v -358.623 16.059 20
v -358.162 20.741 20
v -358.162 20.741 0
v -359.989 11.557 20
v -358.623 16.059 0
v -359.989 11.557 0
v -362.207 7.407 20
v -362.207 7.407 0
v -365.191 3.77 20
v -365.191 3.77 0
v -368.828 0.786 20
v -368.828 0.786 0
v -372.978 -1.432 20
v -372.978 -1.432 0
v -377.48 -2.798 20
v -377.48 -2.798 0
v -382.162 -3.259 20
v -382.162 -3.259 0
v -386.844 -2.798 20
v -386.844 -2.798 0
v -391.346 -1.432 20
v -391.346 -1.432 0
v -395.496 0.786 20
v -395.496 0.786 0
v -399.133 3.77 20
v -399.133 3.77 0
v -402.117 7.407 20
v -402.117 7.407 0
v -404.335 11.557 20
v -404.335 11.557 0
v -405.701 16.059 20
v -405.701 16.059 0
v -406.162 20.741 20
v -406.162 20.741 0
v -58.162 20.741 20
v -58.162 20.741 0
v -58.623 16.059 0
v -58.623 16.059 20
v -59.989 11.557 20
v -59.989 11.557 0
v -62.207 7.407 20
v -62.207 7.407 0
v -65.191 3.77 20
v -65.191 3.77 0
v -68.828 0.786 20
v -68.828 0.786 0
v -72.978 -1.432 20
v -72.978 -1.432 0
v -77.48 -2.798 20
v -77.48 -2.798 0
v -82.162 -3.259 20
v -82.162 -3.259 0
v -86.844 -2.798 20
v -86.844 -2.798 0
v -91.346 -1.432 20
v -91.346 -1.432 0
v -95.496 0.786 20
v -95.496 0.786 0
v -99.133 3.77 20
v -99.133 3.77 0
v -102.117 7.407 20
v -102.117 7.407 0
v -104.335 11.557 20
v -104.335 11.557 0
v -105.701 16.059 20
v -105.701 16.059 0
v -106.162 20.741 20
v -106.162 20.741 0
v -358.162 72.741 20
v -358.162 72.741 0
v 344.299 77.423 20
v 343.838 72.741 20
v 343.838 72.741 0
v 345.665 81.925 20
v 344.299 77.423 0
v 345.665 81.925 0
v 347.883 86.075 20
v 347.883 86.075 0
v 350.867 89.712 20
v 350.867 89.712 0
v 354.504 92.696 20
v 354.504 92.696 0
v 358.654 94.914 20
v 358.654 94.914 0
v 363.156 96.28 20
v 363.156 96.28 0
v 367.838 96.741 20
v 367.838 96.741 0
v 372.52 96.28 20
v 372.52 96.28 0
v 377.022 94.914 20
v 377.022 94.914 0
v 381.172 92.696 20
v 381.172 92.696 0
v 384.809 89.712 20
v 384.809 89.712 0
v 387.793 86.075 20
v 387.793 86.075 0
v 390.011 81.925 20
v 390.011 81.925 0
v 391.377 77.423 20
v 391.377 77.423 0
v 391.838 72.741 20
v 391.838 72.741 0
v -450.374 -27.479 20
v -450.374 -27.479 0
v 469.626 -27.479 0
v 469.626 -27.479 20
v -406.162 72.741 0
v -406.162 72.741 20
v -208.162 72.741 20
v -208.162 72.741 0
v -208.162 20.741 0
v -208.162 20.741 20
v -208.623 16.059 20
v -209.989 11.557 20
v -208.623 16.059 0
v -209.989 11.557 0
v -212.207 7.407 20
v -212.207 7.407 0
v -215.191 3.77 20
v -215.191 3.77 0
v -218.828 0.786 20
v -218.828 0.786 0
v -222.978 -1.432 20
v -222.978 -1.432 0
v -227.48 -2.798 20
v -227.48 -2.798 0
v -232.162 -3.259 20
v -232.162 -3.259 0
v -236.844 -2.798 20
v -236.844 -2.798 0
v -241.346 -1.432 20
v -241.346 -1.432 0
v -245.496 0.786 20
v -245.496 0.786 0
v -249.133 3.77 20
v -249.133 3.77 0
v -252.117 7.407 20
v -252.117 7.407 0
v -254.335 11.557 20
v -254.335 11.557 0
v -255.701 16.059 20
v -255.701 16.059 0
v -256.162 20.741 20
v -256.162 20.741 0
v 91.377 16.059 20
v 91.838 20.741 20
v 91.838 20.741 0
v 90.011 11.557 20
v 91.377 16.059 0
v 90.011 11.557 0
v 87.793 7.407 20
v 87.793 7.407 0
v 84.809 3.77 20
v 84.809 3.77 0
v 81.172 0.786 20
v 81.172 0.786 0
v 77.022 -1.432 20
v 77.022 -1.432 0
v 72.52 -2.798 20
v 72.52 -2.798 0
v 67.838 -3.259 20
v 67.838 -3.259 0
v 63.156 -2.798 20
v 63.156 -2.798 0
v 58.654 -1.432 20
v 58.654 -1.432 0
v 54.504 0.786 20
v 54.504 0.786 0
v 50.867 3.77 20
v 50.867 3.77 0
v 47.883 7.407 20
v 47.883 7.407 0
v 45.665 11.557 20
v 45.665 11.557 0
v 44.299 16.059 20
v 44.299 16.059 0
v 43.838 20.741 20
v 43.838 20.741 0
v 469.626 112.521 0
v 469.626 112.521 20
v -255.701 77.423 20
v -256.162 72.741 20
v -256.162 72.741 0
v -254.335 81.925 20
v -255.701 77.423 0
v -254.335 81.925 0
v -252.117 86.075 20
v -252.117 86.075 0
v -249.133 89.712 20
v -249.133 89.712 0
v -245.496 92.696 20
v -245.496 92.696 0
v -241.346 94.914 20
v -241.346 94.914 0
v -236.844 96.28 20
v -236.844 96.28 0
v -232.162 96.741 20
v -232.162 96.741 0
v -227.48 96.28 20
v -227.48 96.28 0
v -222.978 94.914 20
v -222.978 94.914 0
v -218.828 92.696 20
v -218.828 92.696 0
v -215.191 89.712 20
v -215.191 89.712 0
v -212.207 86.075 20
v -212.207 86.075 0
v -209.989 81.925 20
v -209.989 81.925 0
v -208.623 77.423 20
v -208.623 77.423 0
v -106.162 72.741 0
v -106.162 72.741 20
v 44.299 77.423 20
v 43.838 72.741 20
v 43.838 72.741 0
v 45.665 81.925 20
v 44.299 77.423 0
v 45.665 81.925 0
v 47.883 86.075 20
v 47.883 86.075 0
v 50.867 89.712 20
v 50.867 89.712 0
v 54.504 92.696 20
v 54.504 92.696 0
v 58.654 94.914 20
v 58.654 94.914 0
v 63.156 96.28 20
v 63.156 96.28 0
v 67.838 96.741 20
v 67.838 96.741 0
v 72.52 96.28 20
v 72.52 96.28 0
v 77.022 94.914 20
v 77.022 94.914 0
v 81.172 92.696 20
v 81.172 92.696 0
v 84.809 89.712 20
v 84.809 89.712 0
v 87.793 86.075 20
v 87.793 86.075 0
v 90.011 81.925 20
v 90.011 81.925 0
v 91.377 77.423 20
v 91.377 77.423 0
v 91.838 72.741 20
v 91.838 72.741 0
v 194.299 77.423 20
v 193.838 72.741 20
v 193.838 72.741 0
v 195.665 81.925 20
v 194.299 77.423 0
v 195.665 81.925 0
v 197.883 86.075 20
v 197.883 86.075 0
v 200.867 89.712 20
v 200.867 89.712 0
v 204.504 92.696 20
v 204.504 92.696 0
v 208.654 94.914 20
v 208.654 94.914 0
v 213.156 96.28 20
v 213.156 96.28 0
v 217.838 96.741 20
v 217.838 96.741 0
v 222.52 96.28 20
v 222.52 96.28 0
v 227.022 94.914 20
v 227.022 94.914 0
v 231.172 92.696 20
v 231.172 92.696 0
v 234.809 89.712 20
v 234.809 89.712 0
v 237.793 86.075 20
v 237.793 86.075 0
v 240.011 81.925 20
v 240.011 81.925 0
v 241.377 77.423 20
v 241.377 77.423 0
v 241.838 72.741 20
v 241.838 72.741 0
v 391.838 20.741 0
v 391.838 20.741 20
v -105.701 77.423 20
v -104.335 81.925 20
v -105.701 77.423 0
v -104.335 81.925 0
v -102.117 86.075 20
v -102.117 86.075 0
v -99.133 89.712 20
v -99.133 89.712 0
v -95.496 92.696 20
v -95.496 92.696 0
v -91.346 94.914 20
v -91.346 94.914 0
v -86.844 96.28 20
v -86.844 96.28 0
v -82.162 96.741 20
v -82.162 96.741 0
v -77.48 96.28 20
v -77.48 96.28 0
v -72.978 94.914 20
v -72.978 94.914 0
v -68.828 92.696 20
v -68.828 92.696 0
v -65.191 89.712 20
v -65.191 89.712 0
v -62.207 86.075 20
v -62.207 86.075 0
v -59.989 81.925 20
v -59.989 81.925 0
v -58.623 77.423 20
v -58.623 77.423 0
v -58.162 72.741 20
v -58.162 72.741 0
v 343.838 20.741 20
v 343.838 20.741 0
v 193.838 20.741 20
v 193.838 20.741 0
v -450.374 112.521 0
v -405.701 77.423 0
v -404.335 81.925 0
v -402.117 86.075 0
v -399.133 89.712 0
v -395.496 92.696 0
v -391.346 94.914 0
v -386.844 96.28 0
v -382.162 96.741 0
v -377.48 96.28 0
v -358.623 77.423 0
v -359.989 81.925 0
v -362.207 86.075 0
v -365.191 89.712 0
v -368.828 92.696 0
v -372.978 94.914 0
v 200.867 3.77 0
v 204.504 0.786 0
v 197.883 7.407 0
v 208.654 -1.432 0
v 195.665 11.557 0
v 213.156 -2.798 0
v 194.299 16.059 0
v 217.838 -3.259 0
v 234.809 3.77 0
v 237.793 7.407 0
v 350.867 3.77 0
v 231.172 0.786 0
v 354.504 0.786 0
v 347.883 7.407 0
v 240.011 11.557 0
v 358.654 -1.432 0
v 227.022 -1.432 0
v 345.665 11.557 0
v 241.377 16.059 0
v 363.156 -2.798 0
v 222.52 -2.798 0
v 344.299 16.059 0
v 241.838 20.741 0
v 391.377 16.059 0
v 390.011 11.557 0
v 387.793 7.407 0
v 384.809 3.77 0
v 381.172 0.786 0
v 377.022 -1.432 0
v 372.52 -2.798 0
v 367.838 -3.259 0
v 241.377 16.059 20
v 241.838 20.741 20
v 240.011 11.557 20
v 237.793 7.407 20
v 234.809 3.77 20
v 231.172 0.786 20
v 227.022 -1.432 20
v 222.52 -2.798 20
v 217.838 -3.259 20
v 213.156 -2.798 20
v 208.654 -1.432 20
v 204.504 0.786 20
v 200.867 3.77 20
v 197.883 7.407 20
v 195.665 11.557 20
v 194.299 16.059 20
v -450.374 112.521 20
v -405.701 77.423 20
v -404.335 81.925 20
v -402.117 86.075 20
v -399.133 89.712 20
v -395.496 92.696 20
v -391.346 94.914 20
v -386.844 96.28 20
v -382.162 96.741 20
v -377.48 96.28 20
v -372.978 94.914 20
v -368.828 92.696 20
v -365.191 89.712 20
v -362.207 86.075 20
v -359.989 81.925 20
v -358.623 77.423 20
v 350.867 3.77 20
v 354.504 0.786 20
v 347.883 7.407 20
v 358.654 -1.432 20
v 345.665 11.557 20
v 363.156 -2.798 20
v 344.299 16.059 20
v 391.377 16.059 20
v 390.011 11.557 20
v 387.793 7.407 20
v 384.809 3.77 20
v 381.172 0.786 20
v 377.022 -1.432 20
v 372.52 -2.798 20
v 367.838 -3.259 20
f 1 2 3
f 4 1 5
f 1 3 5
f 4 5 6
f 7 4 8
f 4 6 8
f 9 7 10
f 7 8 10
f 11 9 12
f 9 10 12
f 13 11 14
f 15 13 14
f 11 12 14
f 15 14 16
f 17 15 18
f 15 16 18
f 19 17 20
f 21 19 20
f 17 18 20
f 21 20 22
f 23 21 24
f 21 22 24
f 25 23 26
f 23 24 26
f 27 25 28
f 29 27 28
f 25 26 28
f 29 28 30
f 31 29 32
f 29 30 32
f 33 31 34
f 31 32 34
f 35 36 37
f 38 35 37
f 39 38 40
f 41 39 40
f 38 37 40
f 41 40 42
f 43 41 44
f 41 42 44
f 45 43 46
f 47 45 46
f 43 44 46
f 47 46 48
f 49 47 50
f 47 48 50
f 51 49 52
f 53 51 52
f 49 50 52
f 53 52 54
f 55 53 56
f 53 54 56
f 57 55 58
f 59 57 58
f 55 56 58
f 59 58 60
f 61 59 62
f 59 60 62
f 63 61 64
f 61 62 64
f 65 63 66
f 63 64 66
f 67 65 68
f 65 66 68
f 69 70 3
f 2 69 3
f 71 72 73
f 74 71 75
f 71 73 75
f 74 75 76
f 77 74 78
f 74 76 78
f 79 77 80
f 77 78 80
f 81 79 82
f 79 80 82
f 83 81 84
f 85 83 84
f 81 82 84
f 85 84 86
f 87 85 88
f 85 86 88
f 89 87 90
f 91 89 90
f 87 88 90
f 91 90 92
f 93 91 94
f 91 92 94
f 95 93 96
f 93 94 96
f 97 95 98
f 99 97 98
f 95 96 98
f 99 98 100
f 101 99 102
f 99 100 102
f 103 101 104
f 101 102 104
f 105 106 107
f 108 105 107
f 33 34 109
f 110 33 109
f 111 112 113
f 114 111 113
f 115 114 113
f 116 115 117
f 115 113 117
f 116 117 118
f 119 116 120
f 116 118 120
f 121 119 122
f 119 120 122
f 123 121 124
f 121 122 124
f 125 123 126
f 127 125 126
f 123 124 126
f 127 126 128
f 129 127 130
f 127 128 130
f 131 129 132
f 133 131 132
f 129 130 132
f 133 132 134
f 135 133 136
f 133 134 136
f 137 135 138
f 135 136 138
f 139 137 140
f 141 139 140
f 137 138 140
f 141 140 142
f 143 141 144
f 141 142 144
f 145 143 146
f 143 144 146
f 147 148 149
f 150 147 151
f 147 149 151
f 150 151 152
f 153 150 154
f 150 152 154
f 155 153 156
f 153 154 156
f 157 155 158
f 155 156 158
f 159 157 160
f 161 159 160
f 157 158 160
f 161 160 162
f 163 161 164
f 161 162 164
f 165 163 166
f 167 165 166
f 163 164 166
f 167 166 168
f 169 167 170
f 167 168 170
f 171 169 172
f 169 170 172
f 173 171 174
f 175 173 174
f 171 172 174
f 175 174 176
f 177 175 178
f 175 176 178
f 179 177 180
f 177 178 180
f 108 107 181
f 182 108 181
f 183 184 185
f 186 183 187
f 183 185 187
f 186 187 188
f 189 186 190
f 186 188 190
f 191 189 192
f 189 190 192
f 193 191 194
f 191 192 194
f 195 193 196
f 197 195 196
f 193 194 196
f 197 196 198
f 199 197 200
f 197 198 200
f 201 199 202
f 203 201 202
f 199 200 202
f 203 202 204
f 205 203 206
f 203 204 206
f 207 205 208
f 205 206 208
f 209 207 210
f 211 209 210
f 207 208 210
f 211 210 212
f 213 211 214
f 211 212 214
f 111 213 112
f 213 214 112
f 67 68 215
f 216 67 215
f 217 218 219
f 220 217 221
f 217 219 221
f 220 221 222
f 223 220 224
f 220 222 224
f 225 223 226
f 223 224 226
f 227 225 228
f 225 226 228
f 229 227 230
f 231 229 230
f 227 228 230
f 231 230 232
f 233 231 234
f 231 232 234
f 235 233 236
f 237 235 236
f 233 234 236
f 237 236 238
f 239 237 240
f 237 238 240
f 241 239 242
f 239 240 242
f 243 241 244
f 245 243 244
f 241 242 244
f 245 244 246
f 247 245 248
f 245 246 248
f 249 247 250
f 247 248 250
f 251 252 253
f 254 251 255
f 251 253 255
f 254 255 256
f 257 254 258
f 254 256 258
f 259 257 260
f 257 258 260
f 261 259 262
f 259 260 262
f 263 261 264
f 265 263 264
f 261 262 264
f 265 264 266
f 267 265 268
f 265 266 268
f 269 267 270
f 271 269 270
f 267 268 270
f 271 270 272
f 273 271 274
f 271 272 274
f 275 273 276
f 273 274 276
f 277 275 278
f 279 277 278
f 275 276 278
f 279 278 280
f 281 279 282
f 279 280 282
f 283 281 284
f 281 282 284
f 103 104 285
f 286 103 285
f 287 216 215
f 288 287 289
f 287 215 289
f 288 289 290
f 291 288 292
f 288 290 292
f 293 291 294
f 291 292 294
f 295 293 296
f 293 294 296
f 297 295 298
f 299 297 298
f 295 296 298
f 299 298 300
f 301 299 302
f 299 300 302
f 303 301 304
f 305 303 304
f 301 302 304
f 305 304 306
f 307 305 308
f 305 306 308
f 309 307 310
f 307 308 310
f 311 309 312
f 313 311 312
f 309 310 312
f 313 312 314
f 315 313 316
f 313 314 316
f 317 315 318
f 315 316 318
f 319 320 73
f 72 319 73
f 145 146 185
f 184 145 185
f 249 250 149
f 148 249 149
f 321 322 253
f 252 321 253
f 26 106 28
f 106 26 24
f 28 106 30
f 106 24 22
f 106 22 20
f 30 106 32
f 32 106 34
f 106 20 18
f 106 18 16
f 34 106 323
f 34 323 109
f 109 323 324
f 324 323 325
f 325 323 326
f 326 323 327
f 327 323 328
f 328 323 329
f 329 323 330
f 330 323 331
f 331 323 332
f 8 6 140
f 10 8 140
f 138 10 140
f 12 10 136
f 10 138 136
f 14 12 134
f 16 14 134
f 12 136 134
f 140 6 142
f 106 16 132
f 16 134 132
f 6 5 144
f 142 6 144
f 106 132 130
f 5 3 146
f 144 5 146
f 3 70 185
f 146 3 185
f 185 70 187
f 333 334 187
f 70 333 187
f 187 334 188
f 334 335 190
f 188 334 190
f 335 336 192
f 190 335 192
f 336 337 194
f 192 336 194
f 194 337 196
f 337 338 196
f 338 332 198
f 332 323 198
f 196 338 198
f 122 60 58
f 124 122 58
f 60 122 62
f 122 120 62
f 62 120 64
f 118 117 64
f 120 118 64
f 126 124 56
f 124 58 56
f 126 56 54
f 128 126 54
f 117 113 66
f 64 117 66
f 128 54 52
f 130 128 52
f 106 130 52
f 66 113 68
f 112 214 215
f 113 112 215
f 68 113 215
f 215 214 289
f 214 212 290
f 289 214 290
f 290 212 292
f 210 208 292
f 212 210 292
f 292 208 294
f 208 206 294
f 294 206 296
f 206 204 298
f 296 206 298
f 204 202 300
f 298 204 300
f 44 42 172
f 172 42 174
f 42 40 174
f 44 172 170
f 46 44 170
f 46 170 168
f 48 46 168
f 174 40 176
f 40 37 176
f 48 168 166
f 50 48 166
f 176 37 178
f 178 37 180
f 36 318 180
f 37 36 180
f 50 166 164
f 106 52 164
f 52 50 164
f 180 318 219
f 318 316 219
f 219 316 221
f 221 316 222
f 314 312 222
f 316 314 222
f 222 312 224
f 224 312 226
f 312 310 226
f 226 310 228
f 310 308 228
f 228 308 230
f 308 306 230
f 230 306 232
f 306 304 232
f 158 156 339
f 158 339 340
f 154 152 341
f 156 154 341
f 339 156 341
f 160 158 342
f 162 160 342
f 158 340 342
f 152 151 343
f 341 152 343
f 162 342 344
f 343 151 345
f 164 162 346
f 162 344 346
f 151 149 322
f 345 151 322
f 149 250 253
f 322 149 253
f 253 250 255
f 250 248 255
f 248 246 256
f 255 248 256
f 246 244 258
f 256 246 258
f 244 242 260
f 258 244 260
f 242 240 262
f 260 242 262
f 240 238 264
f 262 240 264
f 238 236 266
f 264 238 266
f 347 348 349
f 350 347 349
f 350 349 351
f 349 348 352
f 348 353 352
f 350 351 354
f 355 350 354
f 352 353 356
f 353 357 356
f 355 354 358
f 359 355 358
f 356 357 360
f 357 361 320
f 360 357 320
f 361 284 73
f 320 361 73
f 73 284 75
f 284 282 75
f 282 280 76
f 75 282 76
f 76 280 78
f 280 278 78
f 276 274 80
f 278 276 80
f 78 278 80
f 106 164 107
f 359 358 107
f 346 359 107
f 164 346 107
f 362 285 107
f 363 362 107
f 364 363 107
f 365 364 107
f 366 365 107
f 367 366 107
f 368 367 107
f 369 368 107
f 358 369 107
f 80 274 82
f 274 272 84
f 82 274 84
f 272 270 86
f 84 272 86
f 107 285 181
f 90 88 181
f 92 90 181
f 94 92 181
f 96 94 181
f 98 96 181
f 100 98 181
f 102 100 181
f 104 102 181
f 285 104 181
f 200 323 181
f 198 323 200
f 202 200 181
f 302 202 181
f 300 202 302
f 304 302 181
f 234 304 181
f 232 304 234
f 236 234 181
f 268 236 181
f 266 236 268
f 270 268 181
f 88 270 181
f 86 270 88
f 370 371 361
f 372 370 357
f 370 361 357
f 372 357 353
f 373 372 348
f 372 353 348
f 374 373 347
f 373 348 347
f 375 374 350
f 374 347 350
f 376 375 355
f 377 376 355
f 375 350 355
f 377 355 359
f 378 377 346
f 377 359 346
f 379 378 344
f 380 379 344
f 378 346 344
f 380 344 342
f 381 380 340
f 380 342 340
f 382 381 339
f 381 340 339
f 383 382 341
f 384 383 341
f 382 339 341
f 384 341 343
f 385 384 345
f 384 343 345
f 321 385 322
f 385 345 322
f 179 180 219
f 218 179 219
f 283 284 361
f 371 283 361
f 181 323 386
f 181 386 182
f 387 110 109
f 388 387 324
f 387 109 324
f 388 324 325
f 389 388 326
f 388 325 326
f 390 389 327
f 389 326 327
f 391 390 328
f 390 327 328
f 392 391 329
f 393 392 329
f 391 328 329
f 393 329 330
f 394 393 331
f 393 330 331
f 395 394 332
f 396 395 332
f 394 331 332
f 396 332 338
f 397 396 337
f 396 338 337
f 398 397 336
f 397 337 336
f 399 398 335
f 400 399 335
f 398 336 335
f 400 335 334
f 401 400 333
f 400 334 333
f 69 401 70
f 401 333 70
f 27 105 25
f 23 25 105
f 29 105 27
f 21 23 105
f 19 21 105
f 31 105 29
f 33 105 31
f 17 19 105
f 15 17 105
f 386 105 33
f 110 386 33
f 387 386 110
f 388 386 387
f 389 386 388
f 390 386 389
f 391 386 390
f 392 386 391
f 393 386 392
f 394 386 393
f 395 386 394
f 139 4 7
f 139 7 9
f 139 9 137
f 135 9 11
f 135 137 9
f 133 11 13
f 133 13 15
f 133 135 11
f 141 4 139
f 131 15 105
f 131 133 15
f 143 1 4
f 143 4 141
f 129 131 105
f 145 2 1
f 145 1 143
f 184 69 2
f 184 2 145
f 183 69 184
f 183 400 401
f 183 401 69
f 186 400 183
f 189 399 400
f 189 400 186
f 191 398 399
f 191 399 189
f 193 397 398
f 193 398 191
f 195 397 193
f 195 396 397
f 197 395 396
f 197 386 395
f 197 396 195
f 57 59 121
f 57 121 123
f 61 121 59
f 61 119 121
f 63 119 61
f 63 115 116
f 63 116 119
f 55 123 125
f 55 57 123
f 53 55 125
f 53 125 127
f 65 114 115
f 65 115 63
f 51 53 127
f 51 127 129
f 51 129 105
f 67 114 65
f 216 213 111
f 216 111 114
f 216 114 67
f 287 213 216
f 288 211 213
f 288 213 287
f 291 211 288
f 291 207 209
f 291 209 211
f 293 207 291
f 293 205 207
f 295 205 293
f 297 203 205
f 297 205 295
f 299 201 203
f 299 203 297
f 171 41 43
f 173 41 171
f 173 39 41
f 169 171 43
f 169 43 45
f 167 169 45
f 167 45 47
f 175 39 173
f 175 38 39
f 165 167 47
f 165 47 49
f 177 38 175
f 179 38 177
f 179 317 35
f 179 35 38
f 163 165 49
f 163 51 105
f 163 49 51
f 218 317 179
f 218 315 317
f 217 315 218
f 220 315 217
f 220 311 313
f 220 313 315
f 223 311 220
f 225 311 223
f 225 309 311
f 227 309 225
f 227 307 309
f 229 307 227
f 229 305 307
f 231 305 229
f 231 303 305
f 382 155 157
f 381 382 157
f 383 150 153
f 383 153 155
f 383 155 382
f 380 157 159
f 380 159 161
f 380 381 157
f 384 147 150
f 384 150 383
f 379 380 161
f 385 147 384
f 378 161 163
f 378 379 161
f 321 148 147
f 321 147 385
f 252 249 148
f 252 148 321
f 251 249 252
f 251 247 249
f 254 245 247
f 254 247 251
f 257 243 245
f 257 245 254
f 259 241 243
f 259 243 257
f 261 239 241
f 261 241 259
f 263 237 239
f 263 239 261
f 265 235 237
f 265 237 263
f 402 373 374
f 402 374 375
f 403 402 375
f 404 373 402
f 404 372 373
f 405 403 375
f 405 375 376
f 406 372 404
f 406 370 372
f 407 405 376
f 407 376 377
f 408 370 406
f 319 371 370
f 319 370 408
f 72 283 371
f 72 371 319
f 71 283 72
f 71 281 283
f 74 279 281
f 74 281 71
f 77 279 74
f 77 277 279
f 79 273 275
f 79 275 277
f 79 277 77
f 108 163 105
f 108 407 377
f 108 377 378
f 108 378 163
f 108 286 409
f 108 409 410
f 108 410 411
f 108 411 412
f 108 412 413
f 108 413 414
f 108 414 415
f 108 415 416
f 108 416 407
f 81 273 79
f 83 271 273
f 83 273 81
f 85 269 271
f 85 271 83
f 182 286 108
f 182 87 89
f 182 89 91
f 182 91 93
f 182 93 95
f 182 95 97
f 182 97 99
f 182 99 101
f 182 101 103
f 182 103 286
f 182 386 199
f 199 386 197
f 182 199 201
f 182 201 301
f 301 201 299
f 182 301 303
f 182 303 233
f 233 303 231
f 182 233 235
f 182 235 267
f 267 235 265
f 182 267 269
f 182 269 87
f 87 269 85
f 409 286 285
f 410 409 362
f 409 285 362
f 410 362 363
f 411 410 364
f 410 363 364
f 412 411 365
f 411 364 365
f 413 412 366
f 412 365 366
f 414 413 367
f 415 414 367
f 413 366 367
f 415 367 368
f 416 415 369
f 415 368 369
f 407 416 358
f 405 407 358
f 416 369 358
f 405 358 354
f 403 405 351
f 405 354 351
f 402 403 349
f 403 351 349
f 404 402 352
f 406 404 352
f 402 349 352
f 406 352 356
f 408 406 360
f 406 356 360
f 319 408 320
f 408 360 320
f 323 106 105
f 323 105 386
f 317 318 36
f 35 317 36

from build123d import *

# Parameters (mm, degrees)
SKETCH1_W           = 920
SKETCH1_H           = 140
BOSS_EXTRUDE1_DEPTH = 20


with BuildPart() as part:
    # Sketch1 → Boss-Extrude1 (new body)
    with BuildSketch(Plane.XY):
        with Locations((9.62605042, 42.521008403)):
            Rectangle(SKETCH1_W, SKETCH1_H)
        with BuildLine():
            Line((-358.161990974, 72.74106151), (-358.161990974, 20.74106151))
            ThreePointArc((-358.161990974, 20.74106151), (-382.161990974, -3.25893849), (-406.161990974, 20.74106151))
            Line((-406.161990974, 20.74106151), (-406.161990974, 72.74106151))
            ThreePointArc((-406.161990974, 72.74106151), (-382.161990974, 96.74106151), (-358.161990974, 72.74106151))
        make_face(mode=Mode.SUBTRACT)
        with BuildLine():
            Line((-208.161990974, 72.74106151), (-208.161990974, 20.74106151))
            ThreePointArc((-208.161990974, 20.74106151), (-232.161990974, -3.25893849), (-256.161990974, 20.74106151))
            Line((-256.161990974, 20.74106151), (-256.161990974, 72.74106151))
            ThreePointArc((-256.161990974, 72.74106151), (-232.161990974, 96.74106151), (-208.161990974, 72.74106151))
        make_face(mode=Mode.SUBTRACT)
        with BuildLine():
            Line((-58.161990974, 72.74106151), (-58.161990974, 20.74106151))
            ThreePointArc((-58.161990974, 20.74106151), (-82.161990974, -3.25893849), (-106.161990974, 20.74106151))
            Line((-106.161990974, 20.74106151), (-106.161990974, 72.74106151))
            ThreePointArc((-106.161990974, 72.74106151), (-82.161990974, 96.74106151), (-58.161990974, 72.74106151))
        make_face(mode=Mode.SUBTRACT)
        with BuildLine():
            Line((91.838009026, 72.74106151), (91.838009026, 20.74106151))
            ThreePointArc((91.838009026, 20.74106151), (67.838009026, -3.25893849), (43.838009026, 20.74106151))
            Line((43.838009026, 20.74106151), (43.838009026, 72.74106151))
            ThreePointArc((43.838009026, 72.74106151), (67.838009026, 96.74106151), (91.838009026, 72.74106151))
        make_face(mode=Mode.SUBTRACT)
        with BuildLine():
            Line((241.838009026, 72.74106151), (241.838009026, 20.74106151))
            ThreePointArc((241.838009026, 20.74106151), (217.838009026, -3.25893849), (193.838009026, 20.74106151))
            Line((193.838009026, 20.74106151), (193.838009026, 72.74106151))
            ThreePointArc((193.838009026, 72.74106151), (217.838009026, 96.74106151), (241.838009026, 72.74106151))
        make_face(mode=Mode.SUBTRACT)
        with BuildLine():
            Line((391.838009026, 72.74106151), (391.838009026, 20.74106151))
            ThreePointArc((391.838009026, 20.74106151), (367.838009026, -3.25893849), (343.838009026, 20.74106151))
            Line((343.838009026, 20.74106151), (343.838009026, 72.74106151))
            ThreePointArc((343.838009026, 72.74106151), (367.838009026, 96.74106151), (391.838009026, 72.74106151))
        make_face(mode=Mode.SUBTRACT)
    extrude(amount=BOSS_EXTRUDE1_DEPTH)


solid = part.part
